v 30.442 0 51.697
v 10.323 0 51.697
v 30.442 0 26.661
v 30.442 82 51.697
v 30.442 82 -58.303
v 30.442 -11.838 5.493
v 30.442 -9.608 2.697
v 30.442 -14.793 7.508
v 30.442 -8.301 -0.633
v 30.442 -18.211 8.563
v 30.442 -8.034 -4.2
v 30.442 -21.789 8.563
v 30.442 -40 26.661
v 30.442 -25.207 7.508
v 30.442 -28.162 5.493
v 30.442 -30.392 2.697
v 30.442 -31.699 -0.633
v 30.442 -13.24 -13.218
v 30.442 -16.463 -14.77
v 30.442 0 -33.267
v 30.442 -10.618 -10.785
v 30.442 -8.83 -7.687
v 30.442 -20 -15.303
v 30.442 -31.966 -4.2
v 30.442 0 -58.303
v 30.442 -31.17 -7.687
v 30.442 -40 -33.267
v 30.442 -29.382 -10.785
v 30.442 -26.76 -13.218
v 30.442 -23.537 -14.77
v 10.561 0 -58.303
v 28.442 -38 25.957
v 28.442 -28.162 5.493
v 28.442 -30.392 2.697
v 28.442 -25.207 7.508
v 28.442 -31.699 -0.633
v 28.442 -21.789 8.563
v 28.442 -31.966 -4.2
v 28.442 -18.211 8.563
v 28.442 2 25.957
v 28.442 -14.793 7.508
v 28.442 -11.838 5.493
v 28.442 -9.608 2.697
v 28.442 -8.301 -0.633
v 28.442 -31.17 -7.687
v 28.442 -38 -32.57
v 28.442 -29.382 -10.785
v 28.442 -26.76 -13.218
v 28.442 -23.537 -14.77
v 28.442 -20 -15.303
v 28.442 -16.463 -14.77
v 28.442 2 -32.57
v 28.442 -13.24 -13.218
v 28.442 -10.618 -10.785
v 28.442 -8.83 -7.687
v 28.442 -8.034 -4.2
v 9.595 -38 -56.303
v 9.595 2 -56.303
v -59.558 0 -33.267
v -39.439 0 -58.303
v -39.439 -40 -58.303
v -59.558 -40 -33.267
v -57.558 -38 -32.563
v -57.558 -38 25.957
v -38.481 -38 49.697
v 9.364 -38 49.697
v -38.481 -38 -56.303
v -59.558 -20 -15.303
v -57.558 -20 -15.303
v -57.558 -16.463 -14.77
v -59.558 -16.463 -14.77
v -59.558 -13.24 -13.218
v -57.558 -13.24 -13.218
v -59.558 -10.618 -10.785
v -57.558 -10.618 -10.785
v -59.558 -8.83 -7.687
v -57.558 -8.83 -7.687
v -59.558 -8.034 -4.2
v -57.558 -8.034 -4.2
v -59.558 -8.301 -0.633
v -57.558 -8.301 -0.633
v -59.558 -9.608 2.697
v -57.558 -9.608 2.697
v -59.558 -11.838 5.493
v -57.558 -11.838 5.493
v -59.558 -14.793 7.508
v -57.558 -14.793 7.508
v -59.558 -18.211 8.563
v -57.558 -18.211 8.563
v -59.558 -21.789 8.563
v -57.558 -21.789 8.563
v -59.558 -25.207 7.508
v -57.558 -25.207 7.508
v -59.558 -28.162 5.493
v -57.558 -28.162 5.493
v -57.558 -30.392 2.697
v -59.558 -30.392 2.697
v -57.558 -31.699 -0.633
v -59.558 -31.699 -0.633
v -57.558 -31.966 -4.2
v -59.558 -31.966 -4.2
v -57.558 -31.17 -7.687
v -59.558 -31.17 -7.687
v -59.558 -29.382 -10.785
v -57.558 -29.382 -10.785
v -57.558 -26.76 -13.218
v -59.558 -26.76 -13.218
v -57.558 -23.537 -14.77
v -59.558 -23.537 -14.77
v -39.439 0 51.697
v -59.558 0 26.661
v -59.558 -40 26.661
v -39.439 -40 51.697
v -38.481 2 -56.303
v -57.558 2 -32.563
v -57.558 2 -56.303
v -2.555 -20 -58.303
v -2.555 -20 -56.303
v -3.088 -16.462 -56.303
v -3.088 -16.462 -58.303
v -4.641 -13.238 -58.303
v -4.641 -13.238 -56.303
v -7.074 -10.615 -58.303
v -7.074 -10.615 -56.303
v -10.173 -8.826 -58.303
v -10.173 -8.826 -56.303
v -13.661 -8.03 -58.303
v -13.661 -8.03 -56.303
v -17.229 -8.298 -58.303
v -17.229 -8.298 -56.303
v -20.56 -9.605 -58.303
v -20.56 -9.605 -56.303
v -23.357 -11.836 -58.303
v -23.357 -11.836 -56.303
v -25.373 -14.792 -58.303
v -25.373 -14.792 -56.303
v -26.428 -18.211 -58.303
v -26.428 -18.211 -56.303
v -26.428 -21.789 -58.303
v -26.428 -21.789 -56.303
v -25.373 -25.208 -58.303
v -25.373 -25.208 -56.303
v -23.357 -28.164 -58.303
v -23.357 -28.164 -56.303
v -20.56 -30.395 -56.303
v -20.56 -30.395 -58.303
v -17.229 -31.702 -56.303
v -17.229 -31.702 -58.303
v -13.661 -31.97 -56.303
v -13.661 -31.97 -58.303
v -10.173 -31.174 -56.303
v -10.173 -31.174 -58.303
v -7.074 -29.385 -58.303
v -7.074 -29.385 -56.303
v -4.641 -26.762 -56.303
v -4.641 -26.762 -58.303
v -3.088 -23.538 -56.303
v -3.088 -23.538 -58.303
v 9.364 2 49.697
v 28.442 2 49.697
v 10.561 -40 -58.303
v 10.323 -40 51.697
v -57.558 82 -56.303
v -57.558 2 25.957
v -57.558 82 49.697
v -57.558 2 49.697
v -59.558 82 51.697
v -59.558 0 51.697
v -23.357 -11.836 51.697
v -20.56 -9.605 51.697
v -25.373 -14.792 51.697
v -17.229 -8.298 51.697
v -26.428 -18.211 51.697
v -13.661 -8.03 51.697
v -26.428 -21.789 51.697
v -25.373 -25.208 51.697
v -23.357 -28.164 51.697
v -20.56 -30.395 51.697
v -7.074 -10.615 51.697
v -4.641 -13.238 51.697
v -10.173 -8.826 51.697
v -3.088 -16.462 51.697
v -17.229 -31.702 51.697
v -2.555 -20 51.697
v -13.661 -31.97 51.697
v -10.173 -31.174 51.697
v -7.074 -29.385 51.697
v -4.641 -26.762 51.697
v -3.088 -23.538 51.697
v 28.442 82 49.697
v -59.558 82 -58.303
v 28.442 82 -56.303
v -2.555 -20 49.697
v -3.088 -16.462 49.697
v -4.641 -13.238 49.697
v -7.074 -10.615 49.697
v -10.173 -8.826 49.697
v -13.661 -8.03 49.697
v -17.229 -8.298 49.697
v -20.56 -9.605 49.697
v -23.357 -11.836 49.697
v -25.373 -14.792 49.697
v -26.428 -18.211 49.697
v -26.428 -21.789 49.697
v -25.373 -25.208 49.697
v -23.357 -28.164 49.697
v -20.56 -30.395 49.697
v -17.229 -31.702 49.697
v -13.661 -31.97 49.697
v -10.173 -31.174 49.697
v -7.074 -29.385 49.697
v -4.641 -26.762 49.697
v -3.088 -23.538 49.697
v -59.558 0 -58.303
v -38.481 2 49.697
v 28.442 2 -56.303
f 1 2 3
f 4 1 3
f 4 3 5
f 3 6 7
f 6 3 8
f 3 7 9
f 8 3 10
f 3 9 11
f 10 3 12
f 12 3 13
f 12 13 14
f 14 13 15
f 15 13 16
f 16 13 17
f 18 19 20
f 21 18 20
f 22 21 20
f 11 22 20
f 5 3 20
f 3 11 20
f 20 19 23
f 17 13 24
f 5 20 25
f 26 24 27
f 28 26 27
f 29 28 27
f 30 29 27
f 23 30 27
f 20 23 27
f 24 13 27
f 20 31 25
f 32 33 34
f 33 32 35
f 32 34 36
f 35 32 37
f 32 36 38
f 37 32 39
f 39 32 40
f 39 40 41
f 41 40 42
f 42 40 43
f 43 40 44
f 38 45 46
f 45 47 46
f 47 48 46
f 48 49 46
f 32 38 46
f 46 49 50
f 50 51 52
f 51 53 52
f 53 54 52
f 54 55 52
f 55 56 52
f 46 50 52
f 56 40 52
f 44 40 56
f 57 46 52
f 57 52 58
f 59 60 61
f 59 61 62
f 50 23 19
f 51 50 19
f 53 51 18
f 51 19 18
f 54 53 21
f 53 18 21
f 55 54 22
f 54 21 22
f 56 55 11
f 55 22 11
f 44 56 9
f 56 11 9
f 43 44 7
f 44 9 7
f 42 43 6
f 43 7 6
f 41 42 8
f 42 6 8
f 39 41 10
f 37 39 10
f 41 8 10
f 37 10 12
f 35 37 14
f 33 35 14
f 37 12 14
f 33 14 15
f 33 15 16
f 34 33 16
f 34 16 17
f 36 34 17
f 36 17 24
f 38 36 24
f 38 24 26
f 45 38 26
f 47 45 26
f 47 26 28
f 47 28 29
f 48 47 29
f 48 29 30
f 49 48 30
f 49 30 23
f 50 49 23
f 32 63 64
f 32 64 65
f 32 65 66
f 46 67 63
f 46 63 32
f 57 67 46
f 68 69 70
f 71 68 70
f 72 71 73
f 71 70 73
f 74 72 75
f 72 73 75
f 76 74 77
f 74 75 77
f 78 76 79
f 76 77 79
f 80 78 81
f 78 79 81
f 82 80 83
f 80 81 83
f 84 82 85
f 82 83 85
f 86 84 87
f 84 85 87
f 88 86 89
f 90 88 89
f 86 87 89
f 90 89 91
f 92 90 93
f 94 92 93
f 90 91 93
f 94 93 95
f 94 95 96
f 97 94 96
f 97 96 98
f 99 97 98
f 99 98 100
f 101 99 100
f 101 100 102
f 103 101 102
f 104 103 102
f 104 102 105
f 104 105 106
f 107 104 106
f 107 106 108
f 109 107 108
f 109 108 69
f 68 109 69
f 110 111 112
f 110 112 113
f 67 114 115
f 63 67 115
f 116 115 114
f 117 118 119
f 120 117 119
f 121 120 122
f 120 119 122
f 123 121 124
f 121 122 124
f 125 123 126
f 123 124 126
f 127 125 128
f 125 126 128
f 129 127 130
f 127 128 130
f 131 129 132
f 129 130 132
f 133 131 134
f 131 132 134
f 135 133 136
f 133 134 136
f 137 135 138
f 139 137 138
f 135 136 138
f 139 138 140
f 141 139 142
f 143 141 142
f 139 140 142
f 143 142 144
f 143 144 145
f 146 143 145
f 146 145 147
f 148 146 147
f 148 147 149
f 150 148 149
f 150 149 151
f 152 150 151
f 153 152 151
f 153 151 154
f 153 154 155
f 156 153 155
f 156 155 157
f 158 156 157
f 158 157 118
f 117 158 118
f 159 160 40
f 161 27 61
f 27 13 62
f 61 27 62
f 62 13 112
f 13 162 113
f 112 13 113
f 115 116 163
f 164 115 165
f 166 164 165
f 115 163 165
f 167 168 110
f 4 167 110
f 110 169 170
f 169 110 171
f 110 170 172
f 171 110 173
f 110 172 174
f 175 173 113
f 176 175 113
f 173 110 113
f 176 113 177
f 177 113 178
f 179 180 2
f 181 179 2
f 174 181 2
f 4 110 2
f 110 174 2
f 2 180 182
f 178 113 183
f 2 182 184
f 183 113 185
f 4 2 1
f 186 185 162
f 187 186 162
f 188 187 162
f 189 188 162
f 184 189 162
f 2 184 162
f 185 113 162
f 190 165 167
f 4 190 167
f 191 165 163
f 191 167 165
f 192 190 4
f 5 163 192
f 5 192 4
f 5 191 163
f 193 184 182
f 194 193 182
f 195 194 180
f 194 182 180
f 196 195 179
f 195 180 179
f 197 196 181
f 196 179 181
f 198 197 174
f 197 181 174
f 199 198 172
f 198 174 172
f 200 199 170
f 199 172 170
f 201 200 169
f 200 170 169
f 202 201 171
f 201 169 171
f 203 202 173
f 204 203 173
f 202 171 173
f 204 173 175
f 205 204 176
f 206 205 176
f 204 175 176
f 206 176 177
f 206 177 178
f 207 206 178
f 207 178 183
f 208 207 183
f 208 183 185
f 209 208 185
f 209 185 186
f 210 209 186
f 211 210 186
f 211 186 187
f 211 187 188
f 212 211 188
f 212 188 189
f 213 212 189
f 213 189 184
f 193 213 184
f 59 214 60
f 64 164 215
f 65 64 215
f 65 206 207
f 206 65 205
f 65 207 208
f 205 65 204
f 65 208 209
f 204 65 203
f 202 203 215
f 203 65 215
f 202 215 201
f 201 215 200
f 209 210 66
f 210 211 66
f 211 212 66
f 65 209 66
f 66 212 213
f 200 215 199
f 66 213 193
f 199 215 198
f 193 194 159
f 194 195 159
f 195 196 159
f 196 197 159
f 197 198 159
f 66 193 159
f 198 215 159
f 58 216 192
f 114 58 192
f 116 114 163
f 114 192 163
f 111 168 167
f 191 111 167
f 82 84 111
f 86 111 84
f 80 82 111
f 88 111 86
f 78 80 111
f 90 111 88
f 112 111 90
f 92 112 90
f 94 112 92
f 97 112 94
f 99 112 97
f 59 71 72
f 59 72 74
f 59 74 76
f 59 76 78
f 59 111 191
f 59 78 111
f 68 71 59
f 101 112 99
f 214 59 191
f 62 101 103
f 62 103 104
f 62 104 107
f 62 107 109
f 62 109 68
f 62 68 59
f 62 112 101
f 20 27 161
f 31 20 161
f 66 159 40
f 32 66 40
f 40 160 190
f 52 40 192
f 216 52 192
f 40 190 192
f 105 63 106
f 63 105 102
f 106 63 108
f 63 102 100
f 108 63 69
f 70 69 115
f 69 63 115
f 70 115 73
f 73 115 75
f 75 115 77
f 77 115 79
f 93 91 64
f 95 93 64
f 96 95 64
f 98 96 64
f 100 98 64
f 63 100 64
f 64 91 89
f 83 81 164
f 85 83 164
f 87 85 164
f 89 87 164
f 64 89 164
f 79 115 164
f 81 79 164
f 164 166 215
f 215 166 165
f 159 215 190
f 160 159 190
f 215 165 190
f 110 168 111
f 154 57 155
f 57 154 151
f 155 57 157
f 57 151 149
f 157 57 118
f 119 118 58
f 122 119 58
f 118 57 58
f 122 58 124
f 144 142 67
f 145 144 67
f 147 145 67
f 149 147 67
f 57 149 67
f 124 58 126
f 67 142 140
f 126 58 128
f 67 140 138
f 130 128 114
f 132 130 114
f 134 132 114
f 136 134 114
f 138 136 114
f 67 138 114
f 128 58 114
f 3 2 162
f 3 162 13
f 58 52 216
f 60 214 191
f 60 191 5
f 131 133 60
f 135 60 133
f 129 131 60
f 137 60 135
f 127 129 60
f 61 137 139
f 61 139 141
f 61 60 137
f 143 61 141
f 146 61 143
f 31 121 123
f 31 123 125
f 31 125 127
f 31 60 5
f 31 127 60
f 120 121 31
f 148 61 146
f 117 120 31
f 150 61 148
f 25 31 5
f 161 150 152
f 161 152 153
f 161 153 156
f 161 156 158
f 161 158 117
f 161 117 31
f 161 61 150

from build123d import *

# Parameters (mm, degrees)
SKETCH1_W           = 90
SKETCH1_H           = 110
BOSS_EXTRUDE1_DEPTH = 82
CUT_EXTRUDE1_DEPTH  = 80
BOSS_EXTRUDE2_DEPTH = 40
CUT_EXTRUDE2_DEPTH  = 40
SKETCH11_R          = 12
CUT_EXTRUDE3_DEPTH  = 94
SKETCH12_R          = 12.003282012
CUT_EXTRUDE4_DEPTH  = 113


with BuildPart() as part:
    # Sketch1 → Boss-Extrude1 (new body)
    with BuildSketch(Plane(origin=(0, 0, 0), x_dir=(1, 0, 0), z_dir=(0, 1, 0))):
        with Locations((-14.558423382, 3.303288505)):
            Rectangle(SKETCH1_W, SKETCH1_H)
    extrude(amount=BOSS_EXTRUDE1_DEPTH)

    # 3DSketch1 → Cut-Extrude1 (cut)
    with BuildSketch(Plane(origin=(28.441576618, 82, 49.696711495), x_dir=(-0.6300408568675958, 0, -0.7765619863716906), z_dir=(0, 1, 0))):
        Polygon((0, 0), (82.315570555, -66.784330828), (136.499084246, 0), (54.183513691, 66.784330828), align=None)
    extrude(amount=-CUT_EXTRUDE1_DEPTH, mode=Mode.SUBTRACT)

    # Sketch7 → Boss-Extrude2 (add)
    with BuildSketch(Plane.XZ):
        Polygon((30.441576618, 26.660546429), (30.441576618, -33.267123439), (10.560534859, -58.303288505), (-39.439465141, -58.303288505), (-59.558423382, -33.267123439), (-59.558423382, 26.660546429), (-39.439465141, 51.696711495), (10.322618378, 51.696711495), align=None)
    extrude(amount=BOSS_EXTRUDE2_DEPTH)

    # Sketch10 → Cut-Extrude2 (cut)
    with BuildSketch(Plane(origin=(0, 2, 0), x_dir=(1, 0, 0), z_dir=(0, 1, 0))):
        Polygon((28.441576618, -25.9565253), (28.441576618, 32.569615498), (9.594834599, 56.303288505), (-38.480908378, 56.303288505), (-57.558423382, 32.563102309), (-57.558423382, -25.9565253), (-38.480908378, -49.696711495), (9.364061615, -49.696711495), align=None)
    extrude(amount=-CUT_EXTRUDE2_DEPTH, mode=Mode.SUBTRACT)

    # Sketch11 → Cut-Extrude3 (cut)
    with BuildSketch(Plane(origin=(30.441576618, 0, 0), x_dir=(0, 0, -1), z_dir=(1, 0, 0))):
        with Locations((3.303288505, -20)):
            Circle(SKETCH11_R)
    extrude(amount=-CUT_EXTRUDE3_DEPTH, mode=Mode.SUBTRACT)

    # Sketch12 → Cut-Extrude4 (cut)
    with BuildSketch(Plane.XY.offset(51.696711495)):
        with Locations((-14.558423382, -20)):
            Circle(SKETCH12_R)
    extrude(amount=-CUT_EXTRUDE4_DEPTH, mode=Mode.SUBTRACT)


solid = part.part
